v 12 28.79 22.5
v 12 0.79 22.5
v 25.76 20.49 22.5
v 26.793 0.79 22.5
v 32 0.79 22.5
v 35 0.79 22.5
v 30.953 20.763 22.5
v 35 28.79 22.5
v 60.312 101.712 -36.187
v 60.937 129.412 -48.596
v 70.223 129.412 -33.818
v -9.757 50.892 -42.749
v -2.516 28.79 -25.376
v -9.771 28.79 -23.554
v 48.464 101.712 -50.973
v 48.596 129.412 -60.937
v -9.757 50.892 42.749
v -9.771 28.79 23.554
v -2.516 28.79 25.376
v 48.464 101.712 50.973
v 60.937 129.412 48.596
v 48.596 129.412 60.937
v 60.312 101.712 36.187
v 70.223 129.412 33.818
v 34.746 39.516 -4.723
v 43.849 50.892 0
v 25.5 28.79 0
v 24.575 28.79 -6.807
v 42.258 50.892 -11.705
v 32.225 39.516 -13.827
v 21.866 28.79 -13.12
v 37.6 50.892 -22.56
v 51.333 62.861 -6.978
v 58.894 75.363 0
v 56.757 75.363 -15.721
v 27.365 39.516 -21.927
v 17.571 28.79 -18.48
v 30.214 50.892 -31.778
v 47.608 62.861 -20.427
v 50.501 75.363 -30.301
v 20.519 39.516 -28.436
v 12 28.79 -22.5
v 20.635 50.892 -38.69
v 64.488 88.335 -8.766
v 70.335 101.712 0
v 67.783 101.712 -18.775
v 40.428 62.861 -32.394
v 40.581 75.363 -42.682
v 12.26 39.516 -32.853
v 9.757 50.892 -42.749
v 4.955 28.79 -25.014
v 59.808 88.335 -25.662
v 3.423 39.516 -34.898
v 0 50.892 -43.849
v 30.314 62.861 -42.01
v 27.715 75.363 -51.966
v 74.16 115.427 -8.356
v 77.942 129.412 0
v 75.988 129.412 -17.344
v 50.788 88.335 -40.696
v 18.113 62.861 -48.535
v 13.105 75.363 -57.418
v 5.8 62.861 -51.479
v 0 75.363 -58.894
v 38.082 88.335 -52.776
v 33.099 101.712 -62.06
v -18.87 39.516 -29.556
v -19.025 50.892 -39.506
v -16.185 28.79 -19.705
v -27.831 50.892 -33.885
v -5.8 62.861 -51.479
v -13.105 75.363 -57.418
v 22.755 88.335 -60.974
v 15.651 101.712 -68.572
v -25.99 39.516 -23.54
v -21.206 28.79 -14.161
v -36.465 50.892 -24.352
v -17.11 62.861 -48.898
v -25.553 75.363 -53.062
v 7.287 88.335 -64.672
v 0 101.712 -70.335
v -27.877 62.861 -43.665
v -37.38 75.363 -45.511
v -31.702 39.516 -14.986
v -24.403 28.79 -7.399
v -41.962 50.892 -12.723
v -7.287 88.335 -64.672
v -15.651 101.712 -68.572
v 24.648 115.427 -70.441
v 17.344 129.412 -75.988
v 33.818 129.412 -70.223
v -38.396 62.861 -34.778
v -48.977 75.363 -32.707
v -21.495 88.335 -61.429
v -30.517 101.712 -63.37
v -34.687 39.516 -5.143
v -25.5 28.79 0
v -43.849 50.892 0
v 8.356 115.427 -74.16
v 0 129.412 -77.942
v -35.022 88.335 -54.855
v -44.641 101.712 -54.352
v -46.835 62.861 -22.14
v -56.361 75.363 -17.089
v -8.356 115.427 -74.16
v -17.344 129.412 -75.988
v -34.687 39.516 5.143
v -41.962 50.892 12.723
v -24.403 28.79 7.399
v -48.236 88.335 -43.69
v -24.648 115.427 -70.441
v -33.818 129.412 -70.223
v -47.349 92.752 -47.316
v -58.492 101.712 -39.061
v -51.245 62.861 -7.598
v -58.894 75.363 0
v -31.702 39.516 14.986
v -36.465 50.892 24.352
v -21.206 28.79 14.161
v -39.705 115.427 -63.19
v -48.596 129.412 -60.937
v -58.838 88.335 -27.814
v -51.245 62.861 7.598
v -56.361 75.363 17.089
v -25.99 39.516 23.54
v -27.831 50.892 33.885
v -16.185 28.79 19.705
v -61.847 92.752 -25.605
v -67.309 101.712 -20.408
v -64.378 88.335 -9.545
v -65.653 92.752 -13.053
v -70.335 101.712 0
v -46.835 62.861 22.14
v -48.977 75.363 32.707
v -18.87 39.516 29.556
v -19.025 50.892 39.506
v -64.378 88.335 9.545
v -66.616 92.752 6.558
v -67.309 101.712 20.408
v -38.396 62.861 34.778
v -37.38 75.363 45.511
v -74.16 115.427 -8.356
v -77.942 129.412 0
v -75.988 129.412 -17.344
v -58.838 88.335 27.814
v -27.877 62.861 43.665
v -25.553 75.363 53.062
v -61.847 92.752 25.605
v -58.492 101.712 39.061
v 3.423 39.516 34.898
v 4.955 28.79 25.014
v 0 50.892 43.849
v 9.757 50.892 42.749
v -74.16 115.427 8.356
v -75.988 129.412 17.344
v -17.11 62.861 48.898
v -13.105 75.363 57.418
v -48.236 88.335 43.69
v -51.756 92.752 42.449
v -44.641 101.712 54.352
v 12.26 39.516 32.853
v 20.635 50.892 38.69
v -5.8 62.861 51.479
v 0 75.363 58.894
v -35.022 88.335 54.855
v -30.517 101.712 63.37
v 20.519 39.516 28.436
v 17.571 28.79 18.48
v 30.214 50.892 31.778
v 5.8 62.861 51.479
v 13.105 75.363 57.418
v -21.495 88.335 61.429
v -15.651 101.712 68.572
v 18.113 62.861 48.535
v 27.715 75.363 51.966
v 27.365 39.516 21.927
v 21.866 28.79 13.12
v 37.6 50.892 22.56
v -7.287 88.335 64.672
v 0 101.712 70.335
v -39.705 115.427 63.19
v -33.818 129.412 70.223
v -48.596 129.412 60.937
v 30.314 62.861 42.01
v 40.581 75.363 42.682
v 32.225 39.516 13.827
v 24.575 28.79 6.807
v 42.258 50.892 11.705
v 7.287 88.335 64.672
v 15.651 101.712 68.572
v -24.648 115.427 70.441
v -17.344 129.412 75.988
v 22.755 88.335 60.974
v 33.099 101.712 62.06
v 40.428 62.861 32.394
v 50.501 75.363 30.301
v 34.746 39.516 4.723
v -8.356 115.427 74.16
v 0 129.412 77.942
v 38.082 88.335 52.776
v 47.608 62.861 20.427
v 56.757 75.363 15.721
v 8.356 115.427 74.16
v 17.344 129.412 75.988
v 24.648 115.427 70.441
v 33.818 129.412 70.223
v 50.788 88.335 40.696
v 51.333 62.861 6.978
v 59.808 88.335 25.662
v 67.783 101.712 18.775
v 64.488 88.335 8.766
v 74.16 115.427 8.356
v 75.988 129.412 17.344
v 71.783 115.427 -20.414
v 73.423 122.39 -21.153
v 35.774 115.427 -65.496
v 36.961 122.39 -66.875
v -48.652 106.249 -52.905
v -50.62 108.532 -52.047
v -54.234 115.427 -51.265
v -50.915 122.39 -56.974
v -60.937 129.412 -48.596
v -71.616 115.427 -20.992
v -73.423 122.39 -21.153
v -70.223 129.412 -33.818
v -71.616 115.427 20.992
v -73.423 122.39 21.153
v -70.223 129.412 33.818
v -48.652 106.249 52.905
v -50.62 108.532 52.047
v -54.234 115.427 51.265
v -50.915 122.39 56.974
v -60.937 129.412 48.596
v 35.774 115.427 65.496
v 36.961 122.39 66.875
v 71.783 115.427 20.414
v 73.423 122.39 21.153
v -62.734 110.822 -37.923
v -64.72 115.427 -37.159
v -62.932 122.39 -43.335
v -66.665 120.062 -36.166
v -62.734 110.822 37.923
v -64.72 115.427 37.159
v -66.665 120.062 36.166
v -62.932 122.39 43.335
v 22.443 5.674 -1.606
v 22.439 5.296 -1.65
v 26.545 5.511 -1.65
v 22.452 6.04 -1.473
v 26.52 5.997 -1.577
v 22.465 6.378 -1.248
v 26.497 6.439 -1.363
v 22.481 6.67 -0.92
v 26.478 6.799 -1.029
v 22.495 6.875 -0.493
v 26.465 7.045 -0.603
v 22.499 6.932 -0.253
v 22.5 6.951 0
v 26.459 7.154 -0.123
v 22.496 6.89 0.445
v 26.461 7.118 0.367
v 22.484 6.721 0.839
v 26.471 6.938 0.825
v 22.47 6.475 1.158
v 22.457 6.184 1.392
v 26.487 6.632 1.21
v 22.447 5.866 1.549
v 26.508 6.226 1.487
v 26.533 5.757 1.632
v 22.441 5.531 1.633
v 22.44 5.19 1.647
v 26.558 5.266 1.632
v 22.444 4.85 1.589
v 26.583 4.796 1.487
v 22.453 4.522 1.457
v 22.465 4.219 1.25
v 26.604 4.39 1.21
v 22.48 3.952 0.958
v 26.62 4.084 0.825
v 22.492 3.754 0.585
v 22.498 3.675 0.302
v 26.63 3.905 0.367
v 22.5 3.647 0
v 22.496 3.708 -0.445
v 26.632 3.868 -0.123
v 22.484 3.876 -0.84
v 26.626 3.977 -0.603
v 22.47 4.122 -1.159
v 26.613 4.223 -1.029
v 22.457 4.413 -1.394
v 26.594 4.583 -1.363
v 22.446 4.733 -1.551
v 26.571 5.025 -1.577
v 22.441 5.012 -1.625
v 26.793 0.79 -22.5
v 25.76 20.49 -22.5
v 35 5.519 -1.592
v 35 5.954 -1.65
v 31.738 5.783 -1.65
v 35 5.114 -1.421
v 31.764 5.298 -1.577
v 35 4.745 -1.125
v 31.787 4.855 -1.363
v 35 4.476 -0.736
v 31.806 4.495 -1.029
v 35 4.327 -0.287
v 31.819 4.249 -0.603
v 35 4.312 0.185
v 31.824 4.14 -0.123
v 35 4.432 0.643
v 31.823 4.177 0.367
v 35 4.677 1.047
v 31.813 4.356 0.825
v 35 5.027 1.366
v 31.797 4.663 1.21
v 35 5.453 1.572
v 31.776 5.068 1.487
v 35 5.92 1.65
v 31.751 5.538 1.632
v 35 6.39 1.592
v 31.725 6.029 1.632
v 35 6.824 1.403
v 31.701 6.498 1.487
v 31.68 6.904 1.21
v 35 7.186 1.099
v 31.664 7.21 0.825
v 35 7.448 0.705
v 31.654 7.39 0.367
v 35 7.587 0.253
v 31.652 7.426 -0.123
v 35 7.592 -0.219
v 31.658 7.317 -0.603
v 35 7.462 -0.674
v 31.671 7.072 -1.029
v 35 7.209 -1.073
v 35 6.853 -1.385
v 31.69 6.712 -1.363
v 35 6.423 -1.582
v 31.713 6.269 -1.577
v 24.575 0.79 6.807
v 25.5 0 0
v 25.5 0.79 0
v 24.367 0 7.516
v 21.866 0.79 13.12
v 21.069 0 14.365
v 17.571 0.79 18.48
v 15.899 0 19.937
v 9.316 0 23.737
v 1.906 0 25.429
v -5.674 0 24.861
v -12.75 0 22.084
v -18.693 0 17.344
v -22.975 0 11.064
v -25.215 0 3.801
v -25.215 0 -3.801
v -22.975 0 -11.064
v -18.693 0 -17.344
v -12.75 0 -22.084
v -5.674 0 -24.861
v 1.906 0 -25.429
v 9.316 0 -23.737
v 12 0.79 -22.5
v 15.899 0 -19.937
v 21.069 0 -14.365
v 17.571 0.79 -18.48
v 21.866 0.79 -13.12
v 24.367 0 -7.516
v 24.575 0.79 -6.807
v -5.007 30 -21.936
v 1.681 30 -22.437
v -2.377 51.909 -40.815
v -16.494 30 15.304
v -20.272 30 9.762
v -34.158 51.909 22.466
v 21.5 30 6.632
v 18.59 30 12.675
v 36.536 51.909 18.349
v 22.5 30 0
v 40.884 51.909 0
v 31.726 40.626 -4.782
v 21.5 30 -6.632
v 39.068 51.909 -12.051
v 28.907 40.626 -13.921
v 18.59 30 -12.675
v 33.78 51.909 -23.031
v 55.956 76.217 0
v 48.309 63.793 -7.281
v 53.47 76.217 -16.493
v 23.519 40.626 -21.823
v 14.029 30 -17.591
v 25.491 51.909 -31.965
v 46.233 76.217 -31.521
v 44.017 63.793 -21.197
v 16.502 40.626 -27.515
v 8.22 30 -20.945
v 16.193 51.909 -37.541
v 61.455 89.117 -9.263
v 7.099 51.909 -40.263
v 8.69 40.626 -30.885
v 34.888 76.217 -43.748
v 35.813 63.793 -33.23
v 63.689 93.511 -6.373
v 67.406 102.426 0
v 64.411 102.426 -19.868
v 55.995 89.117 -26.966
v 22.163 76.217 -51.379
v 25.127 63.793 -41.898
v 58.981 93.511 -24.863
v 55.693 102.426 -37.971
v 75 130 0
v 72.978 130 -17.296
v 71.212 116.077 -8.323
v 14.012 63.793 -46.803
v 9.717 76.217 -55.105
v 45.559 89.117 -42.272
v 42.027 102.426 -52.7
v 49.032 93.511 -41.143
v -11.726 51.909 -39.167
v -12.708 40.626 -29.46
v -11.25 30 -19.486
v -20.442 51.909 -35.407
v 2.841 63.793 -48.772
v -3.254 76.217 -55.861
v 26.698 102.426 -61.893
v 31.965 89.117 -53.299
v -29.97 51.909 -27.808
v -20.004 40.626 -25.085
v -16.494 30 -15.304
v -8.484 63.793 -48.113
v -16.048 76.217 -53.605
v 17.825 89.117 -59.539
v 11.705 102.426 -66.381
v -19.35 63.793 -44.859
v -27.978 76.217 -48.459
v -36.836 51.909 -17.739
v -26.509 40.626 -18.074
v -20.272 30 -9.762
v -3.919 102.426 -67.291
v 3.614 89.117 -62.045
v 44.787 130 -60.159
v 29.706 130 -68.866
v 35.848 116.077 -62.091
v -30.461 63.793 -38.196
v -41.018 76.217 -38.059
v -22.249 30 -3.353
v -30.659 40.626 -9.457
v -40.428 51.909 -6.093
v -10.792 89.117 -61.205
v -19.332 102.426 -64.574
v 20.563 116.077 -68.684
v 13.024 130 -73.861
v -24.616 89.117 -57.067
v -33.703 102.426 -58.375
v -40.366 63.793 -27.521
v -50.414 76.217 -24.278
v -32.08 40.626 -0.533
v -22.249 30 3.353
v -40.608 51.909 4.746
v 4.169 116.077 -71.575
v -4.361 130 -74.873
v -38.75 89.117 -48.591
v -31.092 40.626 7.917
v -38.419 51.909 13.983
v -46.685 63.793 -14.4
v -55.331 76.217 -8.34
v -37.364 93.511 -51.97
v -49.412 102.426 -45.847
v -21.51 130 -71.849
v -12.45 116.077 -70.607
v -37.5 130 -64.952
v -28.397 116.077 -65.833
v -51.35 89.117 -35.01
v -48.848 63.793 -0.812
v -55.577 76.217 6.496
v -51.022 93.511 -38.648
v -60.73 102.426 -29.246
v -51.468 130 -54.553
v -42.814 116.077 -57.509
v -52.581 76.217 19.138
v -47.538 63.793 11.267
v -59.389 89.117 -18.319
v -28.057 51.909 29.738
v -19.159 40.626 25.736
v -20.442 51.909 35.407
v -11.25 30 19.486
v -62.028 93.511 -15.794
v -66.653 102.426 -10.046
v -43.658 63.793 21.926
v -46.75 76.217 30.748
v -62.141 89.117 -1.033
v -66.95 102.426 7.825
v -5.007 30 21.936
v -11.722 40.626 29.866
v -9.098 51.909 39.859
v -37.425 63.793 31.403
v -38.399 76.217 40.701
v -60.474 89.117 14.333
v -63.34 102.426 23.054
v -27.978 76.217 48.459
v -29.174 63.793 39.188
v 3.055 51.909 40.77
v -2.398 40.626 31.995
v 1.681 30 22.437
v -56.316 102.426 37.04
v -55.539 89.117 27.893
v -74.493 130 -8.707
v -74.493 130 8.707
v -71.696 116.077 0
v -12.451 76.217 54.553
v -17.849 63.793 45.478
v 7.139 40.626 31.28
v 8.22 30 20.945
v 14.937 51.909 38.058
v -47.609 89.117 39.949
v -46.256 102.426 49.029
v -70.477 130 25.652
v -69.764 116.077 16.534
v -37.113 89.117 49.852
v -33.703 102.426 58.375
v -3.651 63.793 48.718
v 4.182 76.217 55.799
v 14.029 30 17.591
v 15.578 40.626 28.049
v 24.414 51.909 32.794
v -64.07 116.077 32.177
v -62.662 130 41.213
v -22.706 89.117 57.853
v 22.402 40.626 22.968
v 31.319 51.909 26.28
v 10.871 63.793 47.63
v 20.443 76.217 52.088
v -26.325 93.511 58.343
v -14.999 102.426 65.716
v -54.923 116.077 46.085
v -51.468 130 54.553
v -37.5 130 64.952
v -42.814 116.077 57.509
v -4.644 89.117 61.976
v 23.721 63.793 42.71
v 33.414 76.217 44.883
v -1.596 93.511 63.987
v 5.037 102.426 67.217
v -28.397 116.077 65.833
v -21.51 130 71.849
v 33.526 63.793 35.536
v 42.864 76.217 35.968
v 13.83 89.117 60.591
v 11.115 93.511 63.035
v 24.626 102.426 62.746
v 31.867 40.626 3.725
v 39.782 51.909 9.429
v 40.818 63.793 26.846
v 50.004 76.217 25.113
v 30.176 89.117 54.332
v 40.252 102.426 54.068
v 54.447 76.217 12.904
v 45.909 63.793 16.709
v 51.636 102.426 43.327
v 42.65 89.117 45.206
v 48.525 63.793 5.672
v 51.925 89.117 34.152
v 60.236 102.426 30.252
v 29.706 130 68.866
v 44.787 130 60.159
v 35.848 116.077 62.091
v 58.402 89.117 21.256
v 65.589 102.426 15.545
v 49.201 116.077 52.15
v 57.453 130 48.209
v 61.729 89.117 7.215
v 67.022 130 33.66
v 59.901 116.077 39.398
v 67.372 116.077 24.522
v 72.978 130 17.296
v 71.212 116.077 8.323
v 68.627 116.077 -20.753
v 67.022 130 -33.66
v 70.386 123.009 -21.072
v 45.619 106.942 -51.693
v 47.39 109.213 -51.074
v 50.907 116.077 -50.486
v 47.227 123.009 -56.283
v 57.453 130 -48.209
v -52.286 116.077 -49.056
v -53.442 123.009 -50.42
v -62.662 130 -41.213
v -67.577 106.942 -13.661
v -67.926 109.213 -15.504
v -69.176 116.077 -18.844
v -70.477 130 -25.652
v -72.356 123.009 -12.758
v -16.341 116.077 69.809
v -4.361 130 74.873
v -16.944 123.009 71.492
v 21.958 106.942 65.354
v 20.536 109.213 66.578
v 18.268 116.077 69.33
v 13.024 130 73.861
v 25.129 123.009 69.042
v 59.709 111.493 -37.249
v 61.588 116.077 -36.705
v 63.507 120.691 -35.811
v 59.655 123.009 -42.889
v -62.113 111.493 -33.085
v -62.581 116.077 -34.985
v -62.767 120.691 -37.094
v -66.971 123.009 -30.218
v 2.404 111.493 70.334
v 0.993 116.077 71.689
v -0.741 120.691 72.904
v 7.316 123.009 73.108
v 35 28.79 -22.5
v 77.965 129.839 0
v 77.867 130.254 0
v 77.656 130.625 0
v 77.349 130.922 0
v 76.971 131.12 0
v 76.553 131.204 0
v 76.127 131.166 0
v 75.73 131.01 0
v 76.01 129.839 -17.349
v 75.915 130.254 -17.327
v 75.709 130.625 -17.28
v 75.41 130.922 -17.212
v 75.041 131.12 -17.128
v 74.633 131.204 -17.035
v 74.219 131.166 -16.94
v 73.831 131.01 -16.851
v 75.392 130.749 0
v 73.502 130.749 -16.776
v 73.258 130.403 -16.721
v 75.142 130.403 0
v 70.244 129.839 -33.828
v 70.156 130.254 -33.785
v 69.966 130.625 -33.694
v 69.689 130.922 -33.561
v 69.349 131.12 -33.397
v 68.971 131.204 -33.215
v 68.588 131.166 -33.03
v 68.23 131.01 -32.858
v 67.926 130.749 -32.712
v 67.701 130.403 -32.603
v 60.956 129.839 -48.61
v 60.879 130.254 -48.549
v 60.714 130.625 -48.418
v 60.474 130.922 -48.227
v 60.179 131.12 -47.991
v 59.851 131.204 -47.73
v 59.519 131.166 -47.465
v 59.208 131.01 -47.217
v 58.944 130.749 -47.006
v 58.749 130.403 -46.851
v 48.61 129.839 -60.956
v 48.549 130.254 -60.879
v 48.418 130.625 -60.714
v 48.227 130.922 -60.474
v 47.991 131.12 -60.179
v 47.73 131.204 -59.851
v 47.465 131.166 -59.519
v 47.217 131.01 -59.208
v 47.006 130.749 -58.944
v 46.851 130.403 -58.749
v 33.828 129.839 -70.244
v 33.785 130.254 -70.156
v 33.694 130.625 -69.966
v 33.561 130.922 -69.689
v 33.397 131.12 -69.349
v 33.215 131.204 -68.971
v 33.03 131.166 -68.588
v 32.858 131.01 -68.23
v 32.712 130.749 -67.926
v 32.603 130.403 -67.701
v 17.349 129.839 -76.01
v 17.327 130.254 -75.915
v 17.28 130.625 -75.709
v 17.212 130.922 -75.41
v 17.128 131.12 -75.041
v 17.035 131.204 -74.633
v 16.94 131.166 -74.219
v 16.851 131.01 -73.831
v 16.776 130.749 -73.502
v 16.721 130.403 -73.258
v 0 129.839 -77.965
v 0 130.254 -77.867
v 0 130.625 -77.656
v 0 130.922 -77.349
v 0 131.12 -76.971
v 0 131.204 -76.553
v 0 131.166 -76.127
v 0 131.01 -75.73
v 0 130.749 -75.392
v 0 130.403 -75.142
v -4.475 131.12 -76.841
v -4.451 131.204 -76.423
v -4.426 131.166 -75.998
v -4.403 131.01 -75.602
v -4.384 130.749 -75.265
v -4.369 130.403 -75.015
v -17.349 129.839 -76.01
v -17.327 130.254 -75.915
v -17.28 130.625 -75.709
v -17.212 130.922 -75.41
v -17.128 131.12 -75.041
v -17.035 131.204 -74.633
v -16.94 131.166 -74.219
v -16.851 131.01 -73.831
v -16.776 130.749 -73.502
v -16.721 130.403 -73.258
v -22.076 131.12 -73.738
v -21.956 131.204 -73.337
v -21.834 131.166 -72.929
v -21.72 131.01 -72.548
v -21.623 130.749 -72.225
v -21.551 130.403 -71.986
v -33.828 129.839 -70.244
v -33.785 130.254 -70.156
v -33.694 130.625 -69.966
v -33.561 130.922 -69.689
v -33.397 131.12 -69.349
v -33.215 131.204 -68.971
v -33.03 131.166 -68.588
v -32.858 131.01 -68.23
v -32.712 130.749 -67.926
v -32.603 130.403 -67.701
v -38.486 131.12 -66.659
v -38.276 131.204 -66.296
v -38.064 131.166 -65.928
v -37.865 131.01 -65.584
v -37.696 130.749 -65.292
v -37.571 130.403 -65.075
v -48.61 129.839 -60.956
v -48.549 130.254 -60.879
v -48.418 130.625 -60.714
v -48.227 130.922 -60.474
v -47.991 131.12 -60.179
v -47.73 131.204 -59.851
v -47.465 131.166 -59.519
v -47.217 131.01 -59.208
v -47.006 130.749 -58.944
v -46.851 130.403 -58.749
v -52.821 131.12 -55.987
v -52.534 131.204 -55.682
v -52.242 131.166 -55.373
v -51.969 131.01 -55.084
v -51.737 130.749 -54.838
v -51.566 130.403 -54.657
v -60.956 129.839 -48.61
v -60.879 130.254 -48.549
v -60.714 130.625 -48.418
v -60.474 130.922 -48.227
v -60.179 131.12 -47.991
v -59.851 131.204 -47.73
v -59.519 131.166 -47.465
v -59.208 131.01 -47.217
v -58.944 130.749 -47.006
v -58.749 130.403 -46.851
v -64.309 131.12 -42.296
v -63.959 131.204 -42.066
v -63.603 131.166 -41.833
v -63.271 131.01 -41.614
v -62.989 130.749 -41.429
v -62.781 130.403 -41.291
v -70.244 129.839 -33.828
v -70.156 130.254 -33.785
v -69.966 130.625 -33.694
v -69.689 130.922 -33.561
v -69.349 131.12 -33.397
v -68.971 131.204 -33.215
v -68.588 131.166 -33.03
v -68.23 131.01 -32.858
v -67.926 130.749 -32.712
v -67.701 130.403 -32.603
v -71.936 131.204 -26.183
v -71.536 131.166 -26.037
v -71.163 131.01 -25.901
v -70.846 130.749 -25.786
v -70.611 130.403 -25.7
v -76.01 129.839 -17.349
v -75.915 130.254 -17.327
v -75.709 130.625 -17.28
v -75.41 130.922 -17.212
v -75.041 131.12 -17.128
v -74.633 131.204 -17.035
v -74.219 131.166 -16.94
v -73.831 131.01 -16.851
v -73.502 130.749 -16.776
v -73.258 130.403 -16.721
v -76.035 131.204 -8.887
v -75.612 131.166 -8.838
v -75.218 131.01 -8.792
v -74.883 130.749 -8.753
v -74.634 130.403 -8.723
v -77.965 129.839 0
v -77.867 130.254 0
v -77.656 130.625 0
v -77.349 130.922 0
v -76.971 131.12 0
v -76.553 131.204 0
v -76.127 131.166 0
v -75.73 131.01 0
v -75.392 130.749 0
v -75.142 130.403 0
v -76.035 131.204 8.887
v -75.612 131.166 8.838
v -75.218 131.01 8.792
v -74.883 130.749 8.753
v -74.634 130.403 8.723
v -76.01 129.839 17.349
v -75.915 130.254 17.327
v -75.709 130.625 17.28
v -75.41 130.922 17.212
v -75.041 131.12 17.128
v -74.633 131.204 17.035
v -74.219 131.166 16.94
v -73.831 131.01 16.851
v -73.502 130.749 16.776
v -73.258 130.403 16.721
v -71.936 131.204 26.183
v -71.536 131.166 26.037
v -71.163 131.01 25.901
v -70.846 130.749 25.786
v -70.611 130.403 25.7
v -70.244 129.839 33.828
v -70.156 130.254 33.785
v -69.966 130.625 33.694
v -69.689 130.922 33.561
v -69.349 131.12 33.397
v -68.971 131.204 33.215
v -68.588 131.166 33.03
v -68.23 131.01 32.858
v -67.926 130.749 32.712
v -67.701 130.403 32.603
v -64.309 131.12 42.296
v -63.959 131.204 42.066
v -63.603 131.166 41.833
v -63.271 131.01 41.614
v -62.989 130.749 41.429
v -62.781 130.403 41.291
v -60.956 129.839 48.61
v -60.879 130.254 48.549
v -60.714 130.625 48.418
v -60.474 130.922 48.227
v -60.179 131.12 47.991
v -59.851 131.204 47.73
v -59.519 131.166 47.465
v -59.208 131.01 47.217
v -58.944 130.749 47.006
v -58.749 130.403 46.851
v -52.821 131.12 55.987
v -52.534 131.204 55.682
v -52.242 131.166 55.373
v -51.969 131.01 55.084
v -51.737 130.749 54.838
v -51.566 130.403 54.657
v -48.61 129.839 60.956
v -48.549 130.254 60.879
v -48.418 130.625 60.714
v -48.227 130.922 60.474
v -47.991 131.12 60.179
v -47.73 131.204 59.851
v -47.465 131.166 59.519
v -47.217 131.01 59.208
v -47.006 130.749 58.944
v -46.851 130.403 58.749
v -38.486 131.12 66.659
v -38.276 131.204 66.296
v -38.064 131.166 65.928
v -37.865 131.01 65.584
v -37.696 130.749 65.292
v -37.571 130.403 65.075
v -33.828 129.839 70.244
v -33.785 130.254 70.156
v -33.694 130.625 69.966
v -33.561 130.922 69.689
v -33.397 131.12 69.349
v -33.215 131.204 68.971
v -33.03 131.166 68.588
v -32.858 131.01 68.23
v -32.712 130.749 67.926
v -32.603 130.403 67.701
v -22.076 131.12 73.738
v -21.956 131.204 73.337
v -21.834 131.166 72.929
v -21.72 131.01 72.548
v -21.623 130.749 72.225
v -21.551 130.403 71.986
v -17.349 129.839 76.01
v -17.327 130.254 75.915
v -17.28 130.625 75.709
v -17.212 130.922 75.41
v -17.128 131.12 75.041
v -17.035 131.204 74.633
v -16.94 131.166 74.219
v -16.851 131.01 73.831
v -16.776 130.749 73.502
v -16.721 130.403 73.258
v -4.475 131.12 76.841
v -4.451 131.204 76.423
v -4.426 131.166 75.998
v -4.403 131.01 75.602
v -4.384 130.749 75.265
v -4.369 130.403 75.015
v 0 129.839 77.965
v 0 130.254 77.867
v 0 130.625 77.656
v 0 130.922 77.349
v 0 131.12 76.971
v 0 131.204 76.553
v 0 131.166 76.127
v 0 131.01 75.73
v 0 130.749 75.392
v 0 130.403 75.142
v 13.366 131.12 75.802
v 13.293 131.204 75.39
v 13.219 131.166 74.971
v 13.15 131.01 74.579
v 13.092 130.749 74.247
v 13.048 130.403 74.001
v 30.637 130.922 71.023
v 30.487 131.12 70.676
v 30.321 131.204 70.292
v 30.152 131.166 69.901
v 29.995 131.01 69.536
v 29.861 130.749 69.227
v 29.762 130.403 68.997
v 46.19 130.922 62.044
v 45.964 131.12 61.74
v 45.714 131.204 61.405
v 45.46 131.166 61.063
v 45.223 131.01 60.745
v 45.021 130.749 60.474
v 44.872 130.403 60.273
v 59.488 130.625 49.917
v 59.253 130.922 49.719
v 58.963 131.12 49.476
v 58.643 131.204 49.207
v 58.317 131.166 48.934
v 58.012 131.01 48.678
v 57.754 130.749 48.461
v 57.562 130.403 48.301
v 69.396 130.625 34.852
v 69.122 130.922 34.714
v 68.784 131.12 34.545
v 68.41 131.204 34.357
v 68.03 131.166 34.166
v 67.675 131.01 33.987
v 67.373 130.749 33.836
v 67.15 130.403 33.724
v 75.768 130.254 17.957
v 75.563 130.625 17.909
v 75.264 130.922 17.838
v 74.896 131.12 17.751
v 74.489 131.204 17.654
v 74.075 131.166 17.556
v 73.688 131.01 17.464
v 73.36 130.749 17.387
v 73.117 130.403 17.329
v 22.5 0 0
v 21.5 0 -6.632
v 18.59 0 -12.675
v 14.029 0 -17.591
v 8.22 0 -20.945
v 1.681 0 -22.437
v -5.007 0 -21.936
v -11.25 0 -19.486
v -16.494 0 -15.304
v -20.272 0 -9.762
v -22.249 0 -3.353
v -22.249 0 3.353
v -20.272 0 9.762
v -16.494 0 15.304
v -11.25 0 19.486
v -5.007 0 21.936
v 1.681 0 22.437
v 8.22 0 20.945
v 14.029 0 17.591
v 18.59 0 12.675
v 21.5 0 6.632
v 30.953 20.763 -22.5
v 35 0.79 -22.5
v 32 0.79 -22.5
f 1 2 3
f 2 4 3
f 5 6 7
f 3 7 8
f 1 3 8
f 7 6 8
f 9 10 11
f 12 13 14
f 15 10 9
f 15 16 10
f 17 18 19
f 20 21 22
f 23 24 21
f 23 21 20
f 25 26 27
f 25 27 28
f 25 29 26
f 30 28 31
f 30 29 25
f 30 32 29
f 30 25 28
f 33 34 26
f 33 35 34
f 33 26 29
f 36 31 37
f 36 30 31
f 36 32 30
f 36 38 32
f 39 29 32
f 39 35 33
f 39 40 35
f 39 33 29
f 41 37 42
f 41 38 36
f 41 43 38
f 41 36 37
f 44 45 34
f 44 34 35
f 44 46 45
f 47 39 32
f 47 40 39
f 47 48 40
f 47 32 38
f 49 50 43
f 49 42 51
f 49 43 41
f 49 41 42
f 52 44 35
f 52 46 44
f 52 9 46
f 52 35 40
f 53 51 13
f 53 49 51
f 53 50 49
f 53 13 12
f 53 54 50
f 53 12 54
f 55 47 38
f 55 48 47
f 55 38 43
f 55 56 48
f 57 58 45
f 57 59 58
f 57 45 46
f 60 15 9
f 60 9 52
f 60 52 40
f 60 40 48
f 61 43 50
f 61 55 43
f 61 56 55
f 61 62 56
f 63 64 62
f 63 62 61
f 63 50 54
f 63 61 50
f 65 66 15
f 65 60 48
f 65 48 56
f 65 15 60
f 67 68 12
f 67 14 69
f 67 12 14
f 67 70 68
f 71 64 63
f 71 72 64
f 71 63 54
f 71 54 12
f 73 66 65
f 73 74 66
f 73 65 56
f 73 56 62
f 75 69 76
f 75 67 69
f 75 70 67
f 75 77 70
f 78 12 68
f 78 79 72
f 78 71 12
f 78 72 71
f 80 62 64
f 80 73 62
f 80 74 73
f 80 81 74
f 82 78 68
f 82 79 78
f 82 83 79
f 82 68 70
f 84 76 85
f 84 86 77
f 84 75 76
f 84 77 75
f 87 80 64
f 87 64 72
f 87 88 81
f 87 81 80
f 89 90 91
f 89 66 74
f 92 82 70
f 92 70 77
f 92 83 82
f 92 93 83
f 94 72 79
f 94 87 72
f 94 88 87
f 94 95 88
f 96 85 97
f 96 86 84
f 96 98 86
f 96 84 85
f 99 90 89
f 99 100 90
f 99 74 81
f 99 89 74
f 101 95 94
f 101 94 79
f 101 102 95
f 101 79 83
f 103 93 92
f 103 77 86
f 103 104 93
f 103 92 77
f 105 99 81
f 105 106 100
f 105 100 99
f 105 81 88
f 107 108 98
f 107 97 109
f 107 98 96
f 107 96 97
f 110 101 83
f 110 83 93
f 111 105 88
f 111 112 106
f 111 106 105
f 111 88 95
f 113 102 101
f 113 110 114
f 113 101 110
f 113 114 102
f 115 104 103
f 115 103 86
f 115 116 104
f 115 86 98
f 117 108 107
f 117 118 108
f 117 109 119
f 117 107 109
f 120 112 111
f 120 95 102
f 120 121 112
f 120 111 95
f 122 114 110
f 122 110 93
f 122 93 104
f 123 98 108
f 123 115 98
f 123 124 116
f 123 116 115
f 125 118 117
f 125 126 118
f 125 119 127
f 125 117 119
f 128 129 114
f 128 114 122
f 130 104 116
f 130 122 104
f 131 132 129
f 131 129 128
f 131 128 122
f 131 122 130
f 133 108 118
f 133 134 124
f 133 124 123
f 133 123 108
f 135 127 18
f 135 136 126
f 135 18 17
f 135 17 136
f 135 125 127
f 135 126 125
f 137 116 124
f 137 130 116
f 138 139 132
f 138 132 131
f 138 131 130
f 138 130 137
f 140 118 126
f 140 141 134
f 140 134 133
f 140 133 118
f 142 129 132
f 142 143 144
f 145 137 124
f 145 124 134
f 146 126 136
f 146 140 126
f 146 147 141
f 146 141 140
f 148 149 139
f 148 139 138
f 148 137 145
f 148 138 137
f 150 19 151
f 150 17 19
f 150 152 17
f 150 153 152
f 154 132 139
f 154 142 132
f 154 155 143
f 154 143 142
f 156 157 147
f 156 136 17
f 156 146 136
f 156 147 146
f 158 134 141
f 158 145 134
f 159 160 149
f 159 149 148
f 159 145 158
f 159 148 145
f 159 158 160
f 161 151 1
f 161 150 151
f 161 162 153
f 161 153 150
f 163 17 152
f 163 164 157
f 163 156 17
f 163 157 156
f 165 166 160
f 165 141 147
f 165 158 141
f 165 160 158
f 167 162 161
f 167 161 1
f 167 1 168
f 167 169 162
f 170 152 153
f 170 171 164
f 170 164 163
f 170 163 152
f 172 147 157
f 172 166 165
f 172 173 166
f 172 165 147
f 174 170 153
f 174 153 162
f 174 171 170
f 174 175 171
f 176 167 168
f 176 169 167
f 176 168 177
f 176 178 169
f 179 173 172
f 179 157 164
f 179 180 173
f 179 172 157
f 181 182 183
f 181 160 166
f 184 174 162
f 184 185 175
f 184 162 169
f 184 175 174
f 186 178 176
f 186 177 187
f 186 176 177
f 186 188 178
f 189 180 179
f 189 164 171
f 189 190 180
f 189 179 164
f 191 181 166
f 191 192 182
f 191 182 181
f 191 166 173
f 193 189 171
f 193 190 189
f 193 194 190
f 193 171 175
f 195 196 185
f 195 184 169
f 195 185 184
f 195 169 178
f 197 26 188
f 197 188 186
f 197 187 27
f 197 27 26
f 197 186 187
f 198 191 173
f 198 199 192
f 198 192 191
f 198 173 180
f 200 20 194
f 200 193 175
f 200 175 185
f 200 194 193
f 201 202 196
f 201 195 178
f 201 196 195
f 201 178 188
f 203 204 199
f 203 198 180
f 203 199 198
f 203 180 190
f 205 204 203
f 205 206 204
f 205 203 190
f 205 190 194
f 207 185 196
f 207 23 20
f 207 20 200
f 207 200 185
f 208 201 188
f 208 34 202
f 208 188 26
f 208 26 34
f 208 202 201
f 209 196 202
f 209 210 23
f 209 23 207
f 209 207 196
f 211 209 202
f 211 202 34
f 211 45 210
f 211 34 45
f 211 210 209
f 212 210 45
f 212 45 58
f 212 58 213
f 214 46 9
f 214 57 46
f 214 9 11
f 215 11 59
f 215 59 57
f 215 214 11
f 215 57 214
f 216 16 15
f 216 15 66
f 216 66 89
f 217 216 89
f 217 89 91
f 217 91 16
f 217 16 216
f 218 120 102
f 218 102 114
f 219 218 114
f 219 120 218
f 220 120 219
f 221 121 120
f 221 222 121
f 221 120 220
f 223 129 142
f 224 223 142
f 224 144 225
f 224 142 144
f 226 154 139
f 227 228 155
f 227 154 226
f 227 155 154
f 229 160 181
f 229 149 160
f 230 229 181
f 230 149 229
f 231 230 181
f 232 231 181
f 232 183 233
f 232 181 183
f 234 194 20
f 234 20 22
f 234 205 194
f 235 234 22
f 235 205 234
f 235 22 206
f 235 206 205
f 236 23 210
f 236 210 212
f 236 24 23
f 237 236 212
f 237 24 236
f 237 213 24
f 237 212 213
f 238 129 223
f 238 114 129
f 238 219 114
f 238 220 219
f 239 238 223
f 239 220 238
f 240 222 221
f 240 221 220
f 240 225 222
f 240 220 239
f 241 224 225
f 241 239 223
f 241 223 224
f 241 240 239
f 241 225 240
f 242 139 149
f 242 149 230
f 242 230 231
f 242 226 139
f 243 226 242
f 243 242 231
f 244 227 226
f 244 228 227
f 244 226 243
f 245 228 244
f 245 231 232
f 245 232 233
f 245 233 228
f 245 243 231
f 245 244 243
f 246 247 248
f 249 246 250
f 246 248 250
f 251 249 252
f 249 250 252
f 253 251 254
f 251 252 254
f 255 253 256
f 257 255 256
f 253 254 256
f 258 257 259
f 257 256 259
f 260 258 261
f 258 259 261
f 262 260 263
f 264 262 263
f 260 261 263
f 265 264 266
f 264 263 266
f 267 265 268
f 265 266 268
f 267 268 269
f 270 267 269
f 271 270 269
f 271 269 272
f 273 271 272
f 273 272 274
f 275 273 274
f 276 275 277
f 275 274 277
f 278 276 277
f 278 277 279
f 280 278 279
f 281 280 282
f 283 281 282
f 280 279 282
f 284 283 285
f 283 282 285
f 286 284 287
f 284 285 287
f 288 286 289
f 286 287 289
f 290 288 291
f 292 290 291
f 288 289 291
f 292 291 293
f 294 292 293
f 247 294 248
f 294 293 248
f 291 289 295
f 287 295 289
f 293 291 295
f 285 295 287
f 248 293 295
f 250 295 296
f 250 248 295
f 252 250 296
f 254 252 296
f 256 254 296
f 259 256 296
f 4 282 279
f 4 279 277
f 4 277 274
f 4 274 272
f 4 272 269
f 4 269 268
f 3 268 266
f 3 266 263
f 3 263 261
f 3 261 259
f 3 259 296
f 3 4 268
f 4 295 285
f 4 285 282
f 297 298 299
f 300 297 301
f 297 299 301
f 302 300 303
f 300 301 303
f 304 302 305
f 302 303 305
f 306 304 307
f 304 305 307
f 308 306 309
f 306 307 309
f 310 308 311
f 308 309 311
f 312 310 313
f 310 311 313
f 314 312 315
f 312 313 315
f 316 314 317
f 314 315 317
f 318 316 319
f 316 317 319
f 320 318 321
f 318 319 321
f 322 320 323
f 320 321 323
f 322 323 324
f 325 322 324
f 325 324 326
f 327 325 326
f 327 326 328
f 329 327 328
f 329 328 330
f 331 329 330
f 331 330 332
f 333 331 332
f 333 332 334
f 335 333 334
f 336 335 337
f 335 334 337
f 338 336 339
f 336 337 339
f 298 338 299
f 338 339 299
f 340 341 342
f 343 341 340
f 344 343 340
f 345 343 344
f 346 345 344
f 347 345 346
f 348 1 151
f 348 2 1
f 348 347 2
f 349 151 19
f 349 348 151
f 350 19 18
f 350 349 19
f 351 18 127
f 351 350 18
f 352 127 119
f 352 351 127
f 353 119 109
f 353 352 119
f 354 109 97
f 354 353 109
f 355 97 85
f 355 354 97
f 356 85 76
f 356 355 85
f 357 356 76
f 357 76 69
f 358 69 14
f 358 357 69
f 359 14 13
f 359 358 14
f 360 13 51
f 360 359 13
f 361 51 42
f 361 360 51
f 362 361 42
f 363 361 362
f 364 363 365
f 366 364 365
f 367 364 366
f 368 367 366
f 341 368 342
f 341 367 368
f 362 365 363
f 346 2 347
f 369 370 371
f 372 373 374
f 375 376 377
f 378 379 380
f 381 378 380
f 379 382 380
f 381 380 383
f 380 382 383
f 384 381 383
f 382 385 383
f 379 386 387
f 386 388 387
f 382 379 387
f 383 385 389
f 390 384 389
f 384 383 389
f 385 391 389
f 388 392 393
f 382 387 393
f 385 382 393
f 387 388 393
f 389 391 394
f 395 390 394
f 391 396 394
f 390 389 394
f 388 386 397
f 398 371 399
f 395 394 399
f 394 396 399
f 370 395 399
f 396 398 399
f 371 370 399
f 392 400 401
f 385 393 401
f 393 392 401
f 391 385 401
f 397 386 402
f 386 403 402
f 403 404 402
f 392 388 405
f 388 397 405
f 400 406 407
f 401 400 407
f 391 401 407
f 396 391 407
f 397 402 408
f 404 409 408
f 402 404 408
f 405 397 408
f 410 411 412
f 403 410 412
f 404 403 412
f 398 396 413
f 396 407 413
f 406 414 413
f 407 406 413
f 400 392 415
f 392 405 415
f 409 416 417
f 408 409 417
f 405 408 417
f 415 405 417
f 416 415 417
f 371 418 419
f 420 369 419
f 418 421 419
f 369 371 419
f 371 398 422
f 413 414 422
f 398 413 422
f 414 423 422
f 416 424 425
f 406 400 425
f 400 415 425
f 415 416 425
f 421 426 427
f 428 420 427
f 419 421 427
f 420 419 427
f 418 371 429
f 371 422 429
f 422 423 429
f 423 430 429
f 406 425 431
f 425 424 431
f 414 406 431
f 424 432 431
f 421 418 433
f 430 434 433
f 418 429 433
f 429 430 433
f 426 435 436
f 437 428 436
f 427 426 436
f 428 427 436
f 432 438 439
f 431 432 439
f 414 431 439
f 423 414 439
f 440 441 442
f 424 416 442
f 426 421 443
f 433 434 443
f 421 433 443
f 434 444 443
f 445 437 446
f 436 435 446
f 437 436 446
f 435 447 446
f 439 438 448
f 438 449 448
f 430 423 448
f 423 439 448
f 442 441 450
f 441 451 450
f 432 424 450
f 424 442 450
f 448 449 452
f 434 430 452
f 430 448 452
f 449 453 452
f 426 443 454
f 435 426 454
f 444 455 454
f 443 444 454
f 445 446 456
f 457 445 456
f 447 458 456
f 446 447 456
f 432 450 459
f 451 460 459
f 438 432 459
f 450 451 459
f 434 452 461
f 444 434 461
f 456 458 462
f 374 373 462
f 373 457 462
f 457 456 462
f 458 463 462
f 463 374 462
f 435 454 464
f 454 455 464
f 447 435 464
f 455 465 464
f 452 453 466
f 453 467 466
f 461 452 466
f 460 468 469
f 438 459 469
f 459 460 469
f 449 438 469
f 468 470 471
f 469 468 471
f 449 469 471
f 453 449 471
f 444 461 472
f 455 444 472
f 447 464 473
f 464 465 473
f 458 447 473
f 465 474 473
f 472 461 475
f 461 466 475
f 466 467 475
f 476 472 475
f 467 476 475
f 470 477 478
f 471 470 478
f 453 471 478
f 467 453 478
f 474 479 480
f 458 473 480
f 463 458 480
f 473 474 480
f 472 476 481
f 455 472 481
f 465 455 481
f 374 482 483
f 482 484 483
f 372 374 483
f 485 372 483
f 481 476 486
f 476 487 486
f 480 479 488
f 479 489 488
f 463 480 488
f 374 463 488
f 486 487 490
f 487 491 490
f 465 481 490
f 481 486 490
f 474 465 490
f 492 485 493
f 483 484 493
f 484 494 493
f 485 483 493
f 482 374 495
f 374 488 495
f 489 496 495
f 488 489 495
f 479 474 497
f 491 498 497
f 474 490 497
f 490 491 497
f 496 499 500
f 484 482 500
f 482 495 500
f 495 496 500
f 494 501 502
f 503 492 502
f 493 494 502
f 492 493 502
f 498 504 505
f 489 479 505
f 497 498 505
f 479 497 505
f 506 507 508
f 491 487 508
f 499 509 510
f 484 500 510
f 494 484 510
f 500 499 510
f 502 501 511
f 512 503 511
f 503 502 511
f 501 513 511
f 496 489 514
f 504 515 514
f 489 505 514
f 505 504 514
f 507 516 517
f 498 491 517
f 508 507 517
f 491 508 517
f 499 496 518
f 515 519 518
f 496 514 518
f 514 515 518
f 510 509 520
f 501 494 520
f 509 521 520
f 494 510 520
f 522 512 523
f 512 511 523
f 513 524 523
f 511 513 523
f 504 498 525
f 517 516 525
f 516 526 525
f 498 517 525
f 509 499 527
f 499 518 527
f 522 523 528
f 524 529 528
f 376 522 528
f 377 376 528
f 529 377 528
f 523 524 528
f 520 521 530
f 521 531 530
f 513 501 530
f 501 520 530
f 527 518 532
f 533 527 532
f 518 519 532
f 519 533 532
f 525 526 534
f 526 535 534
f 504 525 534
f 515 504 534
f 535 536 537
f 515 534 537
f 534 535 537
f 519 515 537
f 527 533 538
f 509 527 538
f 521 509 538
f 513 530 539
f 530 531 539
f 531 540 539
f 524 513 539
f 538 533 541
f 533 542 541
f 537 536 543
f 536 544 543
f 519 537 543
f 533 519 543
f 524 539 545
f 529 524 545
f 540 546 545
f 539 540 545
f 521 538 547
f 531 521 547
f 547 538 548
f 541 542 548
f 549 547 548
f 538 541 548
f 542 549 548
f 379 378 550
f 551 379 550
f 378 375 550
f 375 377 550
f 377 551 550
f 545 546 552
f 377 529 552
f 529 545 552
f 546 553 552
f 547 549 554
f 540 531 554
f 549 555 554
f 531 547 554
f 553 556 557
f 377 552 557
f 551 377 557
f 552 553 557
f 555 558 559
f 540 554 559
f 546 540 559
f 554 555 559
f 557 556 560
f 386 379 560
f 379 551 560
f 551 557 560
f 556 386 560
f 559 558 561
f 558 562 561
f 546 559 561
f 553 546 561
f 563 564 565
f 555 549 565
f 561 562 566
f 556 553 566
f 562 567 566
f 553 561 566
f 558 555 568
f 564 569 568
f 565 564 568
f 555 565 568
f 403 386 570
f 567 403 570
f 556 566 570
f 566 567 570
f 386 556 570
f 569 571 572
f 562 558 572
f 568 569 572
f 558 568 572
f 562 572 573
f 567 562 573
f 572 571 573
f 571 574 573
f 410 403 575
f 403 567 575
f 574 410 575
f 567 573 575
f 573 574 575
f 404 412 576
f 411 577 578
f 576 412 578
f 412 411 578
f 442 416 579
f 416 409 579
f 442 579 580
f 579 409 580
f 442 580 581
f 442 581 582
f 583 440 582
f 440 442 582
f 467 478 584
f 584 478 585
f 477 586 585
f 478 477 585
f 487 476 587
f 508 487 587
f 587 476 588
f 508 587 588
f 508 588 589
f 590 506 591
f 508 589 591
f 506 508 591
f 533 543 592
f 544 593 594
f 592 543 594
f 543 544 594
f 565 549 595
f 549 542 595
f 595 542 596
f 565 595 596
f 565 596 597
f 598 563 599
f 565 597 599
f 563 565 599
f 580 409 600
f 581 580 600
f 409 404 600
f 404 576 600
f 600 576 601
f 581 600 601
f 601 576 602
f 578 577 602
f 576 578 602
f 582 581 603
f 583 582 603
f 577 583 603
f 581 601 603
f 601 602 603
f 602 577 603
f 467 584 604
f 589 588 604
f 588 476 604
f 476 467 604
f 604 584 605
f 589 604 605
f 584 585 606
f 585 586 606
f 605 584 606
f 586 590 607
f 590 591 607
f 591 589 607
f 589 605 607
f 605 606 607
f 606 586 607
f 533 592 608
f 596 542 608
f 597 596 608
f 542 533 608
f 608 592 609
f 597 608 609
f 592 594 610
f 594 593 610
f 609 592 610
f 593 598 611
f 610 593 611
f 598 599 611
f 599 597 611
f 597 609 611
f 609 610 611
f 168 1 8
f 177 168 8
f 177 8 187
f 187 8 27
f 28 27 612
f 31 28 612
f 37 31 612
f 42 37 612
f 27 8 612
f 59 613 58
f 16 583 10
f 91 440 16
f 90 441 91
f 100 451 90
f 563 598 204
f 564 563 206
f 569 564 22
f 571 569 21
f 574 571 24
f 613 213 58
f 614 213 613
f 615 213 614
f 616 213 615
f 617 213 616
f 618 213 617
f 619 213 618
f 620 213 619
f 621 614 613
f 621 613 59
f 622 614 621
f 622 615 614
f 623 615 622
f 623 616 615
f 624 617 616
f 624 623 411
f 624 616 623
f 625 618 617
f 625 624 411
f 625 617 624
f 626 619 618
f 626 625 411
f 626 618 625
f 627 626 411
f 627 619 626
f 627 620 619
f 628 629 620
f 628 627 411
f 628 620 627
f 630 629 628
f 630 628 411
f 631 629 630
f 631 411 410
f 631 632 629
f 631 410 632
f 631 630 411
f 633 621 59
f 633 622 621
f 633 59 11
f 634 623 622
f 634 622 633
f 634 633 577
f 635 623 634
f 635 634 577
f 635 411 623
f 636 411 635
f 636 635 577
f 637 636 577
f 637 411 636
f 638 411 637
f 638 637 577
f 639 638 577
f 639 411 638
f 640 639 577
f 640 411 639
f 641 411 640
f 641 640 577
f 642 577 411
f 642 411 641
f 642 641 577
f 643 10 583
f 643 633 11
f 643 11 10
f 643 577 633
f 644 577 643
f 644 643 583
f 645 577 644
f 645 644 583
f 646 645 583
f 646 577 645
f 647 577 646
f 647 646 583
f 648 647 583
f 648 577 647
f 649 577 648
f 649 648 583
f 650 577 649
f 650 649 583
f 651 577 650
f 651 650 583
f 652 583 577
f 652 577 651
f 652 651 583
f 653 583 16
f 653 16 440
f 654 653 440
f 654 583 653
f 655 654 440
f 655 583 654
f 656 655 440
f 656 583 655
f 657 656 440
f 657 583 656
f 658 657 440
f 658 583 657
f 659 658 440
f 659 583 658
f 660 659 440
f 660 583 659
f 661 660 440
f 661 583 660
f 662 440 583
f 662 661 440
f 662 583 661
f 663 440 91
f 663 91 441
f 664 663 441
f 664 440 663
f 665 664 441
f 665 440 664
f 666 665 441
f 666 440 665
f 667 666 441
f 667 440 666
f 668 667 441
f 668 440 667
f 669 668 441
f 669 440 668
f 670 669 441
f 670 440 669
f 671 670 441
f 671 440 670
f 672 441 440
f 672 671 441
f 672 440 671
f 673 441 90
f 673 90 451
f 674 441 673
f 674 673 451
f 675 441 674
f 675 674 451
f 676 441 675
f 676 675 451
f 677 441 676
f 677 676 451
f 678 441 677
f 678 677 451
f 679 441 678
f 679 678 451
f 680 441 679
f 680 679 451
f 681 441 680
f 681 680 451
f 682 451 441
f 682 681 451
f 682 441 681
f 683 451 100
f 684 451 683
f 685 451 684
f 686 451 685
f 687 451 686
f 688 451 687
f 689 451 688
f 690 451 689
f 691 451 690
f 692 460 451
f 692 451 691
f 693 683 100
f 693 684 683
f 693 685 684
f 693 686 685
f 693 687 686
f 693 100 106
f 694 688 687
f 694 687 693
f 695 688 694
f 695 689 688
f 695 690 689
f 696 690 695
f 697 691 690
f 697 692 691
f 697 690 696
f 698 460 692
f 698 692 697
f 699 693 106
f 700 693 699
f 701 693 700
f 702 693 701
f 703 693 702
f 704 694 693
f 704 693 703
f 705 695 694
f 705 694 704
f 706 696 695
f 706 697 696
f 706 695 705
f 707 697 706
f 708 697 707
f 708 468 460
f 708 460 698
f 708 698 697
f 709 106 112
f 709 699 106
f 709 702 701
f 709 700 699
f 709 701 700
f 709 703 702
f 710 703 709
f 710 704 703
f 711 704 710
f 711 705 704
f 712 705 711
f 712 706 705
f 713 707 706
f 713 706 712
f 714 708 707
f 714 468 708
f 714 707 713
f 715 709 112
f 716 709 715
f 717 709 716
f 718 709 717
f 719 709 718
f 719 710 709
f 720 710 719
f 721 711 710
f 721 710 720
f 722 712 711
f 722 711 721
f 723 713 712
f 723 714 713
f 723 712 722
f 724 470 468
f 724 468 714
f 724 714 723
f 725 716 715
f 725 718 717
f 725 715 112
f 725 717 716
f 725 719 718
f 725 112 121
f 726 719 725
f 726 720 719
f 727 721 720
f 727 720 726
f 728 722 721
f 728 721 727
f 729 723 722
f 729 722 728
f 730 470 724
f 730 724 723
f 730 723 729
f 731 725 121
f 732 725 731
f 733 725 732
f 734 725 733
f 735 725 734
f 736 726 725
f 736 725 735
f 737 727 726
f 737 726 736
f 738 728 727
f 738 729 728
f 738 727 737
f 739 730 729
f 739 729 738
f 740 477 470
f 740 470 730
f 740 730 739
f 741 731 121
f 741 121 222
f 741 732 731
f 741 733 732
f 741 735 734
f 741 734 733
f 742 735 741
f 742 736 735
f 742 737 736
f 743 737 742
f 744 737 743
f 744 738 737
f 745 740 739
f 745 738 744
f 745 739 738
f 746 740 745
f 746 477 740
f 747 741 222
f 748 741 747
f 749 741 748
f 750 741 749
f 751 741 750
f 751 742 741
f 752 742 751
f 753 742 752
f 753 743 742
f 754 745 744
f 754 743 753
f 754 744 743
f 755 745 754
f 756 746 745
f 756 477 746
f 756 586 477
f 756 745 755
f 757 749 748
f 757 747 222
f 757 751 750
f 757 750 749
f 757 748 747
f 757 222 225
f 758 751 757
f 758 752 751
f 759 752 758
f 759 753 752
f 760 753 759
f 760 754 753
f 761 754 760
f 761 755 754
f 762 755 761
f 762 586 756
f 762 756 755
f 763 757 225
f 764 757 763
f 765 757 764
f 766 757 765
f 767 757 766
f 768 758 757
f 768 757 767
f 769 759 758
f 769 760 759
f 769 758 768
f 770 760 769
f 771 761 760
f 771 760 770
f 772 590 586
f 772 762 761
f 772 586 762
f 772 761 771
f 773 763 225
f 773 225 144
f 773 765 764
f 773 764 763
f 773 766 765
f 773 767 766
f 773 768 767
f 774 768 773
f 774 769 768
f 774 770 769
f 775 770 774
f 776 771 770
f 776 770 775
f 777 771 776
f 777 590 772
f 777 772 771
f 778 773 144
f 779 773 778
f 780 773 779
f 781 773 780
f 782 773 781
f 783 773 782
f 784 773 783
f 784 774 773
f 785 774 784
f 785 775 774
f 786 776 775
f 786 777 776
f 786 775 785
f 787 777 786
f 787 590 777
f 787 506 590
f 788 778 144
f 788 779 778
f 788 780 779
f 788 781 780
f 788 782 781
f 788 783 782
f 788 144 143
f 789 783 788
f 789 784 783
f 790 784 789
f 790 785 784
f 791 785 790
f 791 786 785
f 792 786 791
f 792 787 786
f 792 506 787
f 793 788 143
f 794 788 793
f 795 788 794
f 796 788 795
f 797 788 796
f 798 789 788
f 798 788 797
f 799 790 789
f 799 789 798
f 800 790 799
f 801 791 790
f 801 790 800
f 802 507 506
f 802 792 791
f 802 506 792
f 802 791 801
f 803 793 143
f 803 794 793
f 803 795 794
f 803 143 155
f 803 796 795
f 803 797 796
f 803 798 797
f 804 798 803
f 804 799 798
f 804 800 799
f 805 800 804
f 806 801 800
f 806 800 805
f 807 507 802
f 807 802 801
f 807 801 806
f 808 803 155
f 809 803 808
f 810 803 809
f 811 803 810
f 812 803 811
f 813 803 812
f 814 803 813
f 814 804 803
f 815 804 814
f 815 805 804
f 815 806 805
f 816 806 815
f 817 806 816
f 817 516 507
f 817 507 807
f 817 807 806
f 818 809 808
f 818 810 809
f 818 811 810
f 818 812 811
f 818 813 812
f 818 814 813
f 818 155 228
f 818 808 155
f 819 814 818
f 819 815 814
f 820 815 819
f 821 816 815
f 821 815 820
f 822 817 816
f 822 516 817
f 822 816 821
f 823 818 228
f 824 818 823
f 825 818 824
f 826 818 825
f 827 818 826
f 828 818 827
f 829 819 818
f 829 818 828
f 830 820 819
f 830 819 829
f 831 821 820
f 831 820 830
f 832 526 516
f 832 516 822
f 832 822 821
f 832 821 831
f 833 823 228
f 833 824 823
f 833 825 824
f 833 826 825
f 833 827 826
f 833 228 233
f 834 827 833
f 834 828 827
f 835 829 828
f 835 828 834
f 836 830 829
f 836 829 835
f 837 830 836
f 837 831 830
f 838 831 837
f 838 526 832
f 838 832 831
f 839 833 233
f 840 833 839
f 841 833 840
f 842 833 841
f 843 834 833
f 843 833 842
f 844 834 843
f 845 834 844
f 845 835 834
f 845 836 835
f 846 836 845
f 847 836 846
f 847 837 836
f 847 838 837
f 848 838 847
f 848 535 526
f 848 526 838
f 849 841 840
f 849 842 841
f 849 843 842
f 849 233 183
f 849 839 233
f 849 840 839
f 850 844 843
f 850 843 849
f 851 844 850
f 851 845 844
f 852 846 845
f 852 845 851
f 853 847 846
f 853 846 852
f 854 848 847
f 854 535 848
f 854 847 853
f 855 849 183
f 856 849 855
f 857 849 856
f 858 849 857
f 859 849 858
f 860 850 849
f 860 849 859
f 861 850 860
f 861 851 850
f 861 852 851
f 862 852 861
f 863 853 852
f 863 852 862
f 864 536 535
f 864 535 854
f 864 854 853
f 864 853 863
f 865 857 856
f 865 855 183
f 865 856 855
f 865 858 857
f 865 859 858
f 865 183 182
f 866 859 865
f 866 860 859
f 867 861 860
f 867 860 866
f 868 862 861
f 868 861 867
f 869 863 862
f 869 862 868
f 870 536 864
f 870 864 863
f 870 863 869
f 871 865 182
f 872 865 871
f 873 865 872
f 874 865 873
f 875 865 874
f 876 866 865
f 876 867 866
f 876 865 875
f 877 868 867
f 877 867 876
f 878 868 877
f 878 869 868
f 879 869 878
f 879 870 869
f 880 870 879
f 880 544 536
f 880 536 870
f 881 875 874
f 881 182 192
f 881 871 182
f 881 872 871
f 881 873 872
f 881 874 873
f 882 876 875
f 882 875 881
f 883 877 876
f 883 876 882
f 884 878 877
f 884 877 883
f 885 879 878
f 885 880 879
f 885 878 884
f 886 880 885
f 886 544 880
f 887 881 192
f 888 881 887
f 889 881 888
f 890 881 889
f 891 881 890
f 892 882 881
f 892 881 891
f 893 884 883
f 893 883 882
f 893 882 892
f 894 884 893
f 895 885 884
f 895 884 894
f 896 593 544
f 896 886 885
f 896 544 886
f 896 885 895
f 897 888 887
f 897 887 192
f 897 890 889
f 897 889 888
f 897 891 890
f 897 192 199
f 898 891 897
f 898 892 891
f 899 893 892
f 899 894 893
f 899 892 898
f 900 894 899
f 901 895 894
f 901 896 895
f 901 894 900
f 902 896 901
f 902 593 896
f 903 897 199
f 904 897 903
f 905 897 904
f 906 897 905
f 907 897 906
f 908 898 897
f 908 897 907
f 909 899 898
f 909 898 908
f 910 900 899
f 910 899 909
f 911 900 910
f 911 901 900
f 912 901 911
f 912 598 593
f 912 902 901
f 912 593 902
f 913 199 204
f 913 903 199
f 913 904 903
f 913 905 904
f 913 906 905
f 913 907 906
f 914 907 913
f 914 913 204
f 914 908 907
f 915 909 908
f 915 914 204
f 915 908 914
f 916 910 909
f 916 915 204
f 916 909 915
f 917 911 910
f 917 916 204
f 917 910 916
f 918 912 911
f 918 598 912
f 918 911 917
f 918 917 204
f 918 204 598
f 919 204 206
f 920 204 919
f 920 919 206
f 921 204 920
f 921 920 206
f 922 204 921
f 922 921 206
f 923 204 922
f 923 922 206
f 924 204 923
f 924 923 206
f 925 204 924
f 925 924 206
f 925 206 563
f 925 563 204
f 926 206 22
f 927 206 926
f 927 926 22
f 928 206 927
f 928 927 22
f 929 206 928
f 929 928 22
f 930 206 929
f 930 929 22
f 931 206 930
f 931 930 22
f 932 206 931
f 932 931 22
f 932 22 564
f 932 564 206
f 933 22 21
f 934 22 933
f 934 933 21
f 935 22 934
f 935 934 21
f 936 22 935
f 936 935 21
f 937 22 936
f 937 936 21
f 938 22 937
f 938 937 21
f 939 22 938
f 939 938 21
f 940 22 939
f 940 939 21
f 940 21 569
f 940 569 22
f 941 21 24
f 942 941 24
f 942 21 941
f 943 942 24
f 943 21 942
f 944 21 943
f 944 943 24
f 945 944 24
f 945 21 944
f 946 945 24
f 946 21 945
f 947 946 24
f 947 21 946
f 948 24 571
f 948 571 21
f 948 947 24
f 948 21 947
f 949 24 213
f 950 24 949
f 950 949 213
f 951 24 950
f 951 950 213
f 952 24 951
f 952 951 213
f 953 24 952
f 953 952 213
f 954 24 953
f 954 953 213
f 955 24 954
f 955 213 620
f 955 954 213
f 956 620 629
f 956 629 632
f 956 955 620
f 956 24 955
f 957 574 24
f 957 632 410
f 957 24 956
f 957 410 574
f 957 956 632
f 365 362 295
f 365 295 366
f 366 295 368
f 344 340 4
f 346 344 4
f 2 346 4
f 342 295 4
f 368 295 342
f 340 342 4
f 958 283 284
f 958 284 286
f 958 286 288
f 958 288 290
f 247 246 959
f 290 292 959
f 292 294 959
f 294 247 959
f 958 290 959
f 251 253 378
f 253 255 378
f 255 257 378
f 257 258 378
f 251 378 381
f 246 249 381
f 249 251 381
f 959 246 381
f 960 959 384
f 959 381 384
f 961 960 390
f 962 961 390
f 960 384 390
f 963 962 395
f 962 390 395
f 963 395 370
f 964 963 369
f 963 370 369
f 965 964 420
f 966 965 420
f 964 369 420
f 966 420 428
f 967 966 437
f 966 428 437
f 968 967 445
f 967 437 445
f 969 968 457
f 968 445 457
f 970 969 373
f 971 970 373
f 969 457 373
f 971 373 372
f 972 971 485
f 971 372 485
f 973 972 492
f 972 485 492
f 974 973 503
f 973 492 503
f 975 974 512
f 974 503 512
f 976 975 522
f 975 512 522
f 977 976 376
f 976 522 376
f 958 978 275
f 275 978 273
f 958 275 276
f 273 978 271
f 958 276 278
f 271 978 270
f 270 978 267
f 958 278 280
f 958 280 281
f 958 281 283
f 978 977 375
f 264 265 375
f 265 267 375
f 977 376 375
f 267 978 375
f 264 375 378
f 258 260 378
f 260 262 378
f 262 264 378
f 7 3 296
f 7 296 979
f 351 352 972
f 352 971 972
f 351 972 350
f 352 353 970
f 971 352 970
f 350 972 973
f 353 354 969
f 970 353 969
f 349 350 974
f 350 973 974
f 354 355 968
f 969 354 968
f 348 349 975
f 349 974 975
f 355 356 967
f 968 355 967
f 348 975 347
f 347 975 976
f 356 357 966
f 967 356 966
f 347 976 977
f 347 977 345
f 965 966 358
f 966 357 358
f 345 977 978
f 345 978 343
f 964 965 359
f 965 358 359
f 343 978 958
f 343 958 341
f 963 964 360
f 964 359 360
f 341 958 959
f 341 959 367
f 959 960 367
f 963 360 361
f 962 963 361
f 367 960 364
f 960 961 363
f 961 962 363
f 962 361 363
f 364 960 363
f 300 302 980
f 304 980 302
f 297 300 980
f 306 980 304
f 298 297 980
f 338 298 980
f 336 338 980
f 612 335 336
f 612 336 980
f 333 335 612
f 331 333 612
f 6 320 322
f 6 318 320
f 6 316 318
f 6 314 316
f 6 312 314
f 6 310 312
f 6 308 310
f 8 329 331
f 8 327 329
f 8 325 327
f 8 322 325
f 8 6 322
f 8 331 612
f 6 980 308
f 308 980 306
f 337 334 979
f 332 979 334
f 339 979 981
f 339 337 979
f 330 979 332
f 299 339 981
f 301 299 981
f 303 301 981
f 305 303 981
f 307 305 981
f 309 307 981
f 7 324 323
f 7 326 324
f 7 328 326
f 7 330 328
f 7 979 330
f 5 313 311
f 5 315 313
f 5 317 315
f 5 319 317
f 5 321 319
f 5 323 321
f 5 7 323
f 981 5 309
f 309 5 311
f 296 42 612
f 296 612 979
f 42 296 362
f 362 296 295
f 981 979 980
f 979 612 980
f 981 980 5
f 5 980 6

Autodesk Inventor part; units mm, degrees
ref_plane "XZ Plane" through (0, 0, 0) normal (0, 1, 0) x (-1, 0, 0)
ref_plane "XY Plane" through (0, 0, 0) normal (0, 0, 1) x (1, 0, 0)
sketch "Sketch1" plane through (0, 0, 0) normal (0, 0, 1) x (1, 0, 0)
  line L0 (0, 0) -> (0, 130)
  line L1 (22.5, 0) -> (22.5, 30)
  arc A0 (22.5, 30) -> (75, 130) centre (-121.124, 169.1839) ccw
  arc A1 (25.5, 28.7901) -> (77.9419, 129.4122) centre (-121.124, 169.1839) ccw
  line L2 (25.5, 28.7901) -> (25.5, 0)
  arc A2 (77.9419, 129.4122) -> (75, 130) centre (76.4709, 129.7061) ccw
  line L3 (22.5, 0) -> (25.5, 0)
  dimension "d0" = 30
  dimension "d1" = 200
  dimension "d2" = 100
  dimension "d3" = 45
  dimension "d4" = 150
  dimension "d5" = 3
revolve "Revolution1" add sketch "Sketch1" angle 360 about axis through (0, 0, 0) along (0, 1, 0)
ref_plane "Work Plane1" through (35, 0, 0) normal (1, 0, 0) x (0, 1, 0)
sketch "Sketch2" plane through (35, 0, 0) normal (1, 0, 0) x (0, 1, 0)
  line L0 (0.7901, 22.5) -> (28.7901, 22.5)
  line L1 (28.7901, 22.5) -> (28.7901, -22.5)
  line L2 (28.7901, -22.5) -> (0.7901, -22.5)
  line L3 (0.7901, -22.5) -> (0.7901, 22.5)
  line L4 (0.7901, 22.5) -> (28.7901, -22.5) construction
  line L5 (28.7901, 22.5) -> (0.7901, -22.5) construction
  line L6 (28.7901, -25.5) -> (28.7901, 25.5) projected
  point P0 (0, 0)
  point P1 (14.7901, 0)
  point P2 (28.7901, 0)
  point P3 (28.7901, 0)
  dimension "d16" = 0
  dimension "d8" = 45
  dimension "d9" = 28
extrude "Extrusion1" add sketch "Sketch2" against normal up to next
sketch "Sketch3" plane through (35, 0.7901, 22.5) normal (0, 0, 1) x (1, 0, 0)
  line L0 (-4.0467, 19.9726) -> (-3, 0)
  line L1 (-3, 0) -> (-8.1929, -0.2721)
  line L2 (-8.1929, -0.2721) -> (-9.2396, 19.7004)
  line L3 (-9.2396, 19.7004) -> (-4.0467, 19.9726)
  line L4 (-4.0467, 19.9726) -> (-8.1929, -0.2721) construction
  line L5 (-3, 0) -> (-9.2396, 19.7004) construction
  line L6 (0, 28) -> (0, 0) projected
  line L7 (0, 0) -> (-23, 0) projected
  point P0 (-35, -0.7901)
  point P1 (-6.1198, 9.8502)
  point P2 (-6.1198, 9.8502)
  point P3 (0, 14)
  point P4 (-8.2071, 0)
  dimension "d12" = 93
  dimension "d13" = 5.2
  dimension "d14" = 20
  dimension "d15" = 3
extrude "Extrusion2" cut sketch "Sketch3" against normal through all contours L0 L7 L2 L3
sketch "Sketch4" plane through (25.7604, 20.4906, 22.5) normal (0.9986, 0.0523, 0) x (0, 0, -1)
  circle A0 centre (22.5, -15) radius 1.65
  line L0 (45, -19.7275) -> (0, -19.7275) projected
  line L1 (0, 0) -> (45, 0) projected
  point P0 (22.5, -19.1143)
  point P1 (22.5, -19.7275)
  dimension "d18" = 3.3
  dimension "d19" = 15
extrude "Extrusion3" cut sketch "Sketch4" along normal mid plane 25
properties part number "Cone FV"
